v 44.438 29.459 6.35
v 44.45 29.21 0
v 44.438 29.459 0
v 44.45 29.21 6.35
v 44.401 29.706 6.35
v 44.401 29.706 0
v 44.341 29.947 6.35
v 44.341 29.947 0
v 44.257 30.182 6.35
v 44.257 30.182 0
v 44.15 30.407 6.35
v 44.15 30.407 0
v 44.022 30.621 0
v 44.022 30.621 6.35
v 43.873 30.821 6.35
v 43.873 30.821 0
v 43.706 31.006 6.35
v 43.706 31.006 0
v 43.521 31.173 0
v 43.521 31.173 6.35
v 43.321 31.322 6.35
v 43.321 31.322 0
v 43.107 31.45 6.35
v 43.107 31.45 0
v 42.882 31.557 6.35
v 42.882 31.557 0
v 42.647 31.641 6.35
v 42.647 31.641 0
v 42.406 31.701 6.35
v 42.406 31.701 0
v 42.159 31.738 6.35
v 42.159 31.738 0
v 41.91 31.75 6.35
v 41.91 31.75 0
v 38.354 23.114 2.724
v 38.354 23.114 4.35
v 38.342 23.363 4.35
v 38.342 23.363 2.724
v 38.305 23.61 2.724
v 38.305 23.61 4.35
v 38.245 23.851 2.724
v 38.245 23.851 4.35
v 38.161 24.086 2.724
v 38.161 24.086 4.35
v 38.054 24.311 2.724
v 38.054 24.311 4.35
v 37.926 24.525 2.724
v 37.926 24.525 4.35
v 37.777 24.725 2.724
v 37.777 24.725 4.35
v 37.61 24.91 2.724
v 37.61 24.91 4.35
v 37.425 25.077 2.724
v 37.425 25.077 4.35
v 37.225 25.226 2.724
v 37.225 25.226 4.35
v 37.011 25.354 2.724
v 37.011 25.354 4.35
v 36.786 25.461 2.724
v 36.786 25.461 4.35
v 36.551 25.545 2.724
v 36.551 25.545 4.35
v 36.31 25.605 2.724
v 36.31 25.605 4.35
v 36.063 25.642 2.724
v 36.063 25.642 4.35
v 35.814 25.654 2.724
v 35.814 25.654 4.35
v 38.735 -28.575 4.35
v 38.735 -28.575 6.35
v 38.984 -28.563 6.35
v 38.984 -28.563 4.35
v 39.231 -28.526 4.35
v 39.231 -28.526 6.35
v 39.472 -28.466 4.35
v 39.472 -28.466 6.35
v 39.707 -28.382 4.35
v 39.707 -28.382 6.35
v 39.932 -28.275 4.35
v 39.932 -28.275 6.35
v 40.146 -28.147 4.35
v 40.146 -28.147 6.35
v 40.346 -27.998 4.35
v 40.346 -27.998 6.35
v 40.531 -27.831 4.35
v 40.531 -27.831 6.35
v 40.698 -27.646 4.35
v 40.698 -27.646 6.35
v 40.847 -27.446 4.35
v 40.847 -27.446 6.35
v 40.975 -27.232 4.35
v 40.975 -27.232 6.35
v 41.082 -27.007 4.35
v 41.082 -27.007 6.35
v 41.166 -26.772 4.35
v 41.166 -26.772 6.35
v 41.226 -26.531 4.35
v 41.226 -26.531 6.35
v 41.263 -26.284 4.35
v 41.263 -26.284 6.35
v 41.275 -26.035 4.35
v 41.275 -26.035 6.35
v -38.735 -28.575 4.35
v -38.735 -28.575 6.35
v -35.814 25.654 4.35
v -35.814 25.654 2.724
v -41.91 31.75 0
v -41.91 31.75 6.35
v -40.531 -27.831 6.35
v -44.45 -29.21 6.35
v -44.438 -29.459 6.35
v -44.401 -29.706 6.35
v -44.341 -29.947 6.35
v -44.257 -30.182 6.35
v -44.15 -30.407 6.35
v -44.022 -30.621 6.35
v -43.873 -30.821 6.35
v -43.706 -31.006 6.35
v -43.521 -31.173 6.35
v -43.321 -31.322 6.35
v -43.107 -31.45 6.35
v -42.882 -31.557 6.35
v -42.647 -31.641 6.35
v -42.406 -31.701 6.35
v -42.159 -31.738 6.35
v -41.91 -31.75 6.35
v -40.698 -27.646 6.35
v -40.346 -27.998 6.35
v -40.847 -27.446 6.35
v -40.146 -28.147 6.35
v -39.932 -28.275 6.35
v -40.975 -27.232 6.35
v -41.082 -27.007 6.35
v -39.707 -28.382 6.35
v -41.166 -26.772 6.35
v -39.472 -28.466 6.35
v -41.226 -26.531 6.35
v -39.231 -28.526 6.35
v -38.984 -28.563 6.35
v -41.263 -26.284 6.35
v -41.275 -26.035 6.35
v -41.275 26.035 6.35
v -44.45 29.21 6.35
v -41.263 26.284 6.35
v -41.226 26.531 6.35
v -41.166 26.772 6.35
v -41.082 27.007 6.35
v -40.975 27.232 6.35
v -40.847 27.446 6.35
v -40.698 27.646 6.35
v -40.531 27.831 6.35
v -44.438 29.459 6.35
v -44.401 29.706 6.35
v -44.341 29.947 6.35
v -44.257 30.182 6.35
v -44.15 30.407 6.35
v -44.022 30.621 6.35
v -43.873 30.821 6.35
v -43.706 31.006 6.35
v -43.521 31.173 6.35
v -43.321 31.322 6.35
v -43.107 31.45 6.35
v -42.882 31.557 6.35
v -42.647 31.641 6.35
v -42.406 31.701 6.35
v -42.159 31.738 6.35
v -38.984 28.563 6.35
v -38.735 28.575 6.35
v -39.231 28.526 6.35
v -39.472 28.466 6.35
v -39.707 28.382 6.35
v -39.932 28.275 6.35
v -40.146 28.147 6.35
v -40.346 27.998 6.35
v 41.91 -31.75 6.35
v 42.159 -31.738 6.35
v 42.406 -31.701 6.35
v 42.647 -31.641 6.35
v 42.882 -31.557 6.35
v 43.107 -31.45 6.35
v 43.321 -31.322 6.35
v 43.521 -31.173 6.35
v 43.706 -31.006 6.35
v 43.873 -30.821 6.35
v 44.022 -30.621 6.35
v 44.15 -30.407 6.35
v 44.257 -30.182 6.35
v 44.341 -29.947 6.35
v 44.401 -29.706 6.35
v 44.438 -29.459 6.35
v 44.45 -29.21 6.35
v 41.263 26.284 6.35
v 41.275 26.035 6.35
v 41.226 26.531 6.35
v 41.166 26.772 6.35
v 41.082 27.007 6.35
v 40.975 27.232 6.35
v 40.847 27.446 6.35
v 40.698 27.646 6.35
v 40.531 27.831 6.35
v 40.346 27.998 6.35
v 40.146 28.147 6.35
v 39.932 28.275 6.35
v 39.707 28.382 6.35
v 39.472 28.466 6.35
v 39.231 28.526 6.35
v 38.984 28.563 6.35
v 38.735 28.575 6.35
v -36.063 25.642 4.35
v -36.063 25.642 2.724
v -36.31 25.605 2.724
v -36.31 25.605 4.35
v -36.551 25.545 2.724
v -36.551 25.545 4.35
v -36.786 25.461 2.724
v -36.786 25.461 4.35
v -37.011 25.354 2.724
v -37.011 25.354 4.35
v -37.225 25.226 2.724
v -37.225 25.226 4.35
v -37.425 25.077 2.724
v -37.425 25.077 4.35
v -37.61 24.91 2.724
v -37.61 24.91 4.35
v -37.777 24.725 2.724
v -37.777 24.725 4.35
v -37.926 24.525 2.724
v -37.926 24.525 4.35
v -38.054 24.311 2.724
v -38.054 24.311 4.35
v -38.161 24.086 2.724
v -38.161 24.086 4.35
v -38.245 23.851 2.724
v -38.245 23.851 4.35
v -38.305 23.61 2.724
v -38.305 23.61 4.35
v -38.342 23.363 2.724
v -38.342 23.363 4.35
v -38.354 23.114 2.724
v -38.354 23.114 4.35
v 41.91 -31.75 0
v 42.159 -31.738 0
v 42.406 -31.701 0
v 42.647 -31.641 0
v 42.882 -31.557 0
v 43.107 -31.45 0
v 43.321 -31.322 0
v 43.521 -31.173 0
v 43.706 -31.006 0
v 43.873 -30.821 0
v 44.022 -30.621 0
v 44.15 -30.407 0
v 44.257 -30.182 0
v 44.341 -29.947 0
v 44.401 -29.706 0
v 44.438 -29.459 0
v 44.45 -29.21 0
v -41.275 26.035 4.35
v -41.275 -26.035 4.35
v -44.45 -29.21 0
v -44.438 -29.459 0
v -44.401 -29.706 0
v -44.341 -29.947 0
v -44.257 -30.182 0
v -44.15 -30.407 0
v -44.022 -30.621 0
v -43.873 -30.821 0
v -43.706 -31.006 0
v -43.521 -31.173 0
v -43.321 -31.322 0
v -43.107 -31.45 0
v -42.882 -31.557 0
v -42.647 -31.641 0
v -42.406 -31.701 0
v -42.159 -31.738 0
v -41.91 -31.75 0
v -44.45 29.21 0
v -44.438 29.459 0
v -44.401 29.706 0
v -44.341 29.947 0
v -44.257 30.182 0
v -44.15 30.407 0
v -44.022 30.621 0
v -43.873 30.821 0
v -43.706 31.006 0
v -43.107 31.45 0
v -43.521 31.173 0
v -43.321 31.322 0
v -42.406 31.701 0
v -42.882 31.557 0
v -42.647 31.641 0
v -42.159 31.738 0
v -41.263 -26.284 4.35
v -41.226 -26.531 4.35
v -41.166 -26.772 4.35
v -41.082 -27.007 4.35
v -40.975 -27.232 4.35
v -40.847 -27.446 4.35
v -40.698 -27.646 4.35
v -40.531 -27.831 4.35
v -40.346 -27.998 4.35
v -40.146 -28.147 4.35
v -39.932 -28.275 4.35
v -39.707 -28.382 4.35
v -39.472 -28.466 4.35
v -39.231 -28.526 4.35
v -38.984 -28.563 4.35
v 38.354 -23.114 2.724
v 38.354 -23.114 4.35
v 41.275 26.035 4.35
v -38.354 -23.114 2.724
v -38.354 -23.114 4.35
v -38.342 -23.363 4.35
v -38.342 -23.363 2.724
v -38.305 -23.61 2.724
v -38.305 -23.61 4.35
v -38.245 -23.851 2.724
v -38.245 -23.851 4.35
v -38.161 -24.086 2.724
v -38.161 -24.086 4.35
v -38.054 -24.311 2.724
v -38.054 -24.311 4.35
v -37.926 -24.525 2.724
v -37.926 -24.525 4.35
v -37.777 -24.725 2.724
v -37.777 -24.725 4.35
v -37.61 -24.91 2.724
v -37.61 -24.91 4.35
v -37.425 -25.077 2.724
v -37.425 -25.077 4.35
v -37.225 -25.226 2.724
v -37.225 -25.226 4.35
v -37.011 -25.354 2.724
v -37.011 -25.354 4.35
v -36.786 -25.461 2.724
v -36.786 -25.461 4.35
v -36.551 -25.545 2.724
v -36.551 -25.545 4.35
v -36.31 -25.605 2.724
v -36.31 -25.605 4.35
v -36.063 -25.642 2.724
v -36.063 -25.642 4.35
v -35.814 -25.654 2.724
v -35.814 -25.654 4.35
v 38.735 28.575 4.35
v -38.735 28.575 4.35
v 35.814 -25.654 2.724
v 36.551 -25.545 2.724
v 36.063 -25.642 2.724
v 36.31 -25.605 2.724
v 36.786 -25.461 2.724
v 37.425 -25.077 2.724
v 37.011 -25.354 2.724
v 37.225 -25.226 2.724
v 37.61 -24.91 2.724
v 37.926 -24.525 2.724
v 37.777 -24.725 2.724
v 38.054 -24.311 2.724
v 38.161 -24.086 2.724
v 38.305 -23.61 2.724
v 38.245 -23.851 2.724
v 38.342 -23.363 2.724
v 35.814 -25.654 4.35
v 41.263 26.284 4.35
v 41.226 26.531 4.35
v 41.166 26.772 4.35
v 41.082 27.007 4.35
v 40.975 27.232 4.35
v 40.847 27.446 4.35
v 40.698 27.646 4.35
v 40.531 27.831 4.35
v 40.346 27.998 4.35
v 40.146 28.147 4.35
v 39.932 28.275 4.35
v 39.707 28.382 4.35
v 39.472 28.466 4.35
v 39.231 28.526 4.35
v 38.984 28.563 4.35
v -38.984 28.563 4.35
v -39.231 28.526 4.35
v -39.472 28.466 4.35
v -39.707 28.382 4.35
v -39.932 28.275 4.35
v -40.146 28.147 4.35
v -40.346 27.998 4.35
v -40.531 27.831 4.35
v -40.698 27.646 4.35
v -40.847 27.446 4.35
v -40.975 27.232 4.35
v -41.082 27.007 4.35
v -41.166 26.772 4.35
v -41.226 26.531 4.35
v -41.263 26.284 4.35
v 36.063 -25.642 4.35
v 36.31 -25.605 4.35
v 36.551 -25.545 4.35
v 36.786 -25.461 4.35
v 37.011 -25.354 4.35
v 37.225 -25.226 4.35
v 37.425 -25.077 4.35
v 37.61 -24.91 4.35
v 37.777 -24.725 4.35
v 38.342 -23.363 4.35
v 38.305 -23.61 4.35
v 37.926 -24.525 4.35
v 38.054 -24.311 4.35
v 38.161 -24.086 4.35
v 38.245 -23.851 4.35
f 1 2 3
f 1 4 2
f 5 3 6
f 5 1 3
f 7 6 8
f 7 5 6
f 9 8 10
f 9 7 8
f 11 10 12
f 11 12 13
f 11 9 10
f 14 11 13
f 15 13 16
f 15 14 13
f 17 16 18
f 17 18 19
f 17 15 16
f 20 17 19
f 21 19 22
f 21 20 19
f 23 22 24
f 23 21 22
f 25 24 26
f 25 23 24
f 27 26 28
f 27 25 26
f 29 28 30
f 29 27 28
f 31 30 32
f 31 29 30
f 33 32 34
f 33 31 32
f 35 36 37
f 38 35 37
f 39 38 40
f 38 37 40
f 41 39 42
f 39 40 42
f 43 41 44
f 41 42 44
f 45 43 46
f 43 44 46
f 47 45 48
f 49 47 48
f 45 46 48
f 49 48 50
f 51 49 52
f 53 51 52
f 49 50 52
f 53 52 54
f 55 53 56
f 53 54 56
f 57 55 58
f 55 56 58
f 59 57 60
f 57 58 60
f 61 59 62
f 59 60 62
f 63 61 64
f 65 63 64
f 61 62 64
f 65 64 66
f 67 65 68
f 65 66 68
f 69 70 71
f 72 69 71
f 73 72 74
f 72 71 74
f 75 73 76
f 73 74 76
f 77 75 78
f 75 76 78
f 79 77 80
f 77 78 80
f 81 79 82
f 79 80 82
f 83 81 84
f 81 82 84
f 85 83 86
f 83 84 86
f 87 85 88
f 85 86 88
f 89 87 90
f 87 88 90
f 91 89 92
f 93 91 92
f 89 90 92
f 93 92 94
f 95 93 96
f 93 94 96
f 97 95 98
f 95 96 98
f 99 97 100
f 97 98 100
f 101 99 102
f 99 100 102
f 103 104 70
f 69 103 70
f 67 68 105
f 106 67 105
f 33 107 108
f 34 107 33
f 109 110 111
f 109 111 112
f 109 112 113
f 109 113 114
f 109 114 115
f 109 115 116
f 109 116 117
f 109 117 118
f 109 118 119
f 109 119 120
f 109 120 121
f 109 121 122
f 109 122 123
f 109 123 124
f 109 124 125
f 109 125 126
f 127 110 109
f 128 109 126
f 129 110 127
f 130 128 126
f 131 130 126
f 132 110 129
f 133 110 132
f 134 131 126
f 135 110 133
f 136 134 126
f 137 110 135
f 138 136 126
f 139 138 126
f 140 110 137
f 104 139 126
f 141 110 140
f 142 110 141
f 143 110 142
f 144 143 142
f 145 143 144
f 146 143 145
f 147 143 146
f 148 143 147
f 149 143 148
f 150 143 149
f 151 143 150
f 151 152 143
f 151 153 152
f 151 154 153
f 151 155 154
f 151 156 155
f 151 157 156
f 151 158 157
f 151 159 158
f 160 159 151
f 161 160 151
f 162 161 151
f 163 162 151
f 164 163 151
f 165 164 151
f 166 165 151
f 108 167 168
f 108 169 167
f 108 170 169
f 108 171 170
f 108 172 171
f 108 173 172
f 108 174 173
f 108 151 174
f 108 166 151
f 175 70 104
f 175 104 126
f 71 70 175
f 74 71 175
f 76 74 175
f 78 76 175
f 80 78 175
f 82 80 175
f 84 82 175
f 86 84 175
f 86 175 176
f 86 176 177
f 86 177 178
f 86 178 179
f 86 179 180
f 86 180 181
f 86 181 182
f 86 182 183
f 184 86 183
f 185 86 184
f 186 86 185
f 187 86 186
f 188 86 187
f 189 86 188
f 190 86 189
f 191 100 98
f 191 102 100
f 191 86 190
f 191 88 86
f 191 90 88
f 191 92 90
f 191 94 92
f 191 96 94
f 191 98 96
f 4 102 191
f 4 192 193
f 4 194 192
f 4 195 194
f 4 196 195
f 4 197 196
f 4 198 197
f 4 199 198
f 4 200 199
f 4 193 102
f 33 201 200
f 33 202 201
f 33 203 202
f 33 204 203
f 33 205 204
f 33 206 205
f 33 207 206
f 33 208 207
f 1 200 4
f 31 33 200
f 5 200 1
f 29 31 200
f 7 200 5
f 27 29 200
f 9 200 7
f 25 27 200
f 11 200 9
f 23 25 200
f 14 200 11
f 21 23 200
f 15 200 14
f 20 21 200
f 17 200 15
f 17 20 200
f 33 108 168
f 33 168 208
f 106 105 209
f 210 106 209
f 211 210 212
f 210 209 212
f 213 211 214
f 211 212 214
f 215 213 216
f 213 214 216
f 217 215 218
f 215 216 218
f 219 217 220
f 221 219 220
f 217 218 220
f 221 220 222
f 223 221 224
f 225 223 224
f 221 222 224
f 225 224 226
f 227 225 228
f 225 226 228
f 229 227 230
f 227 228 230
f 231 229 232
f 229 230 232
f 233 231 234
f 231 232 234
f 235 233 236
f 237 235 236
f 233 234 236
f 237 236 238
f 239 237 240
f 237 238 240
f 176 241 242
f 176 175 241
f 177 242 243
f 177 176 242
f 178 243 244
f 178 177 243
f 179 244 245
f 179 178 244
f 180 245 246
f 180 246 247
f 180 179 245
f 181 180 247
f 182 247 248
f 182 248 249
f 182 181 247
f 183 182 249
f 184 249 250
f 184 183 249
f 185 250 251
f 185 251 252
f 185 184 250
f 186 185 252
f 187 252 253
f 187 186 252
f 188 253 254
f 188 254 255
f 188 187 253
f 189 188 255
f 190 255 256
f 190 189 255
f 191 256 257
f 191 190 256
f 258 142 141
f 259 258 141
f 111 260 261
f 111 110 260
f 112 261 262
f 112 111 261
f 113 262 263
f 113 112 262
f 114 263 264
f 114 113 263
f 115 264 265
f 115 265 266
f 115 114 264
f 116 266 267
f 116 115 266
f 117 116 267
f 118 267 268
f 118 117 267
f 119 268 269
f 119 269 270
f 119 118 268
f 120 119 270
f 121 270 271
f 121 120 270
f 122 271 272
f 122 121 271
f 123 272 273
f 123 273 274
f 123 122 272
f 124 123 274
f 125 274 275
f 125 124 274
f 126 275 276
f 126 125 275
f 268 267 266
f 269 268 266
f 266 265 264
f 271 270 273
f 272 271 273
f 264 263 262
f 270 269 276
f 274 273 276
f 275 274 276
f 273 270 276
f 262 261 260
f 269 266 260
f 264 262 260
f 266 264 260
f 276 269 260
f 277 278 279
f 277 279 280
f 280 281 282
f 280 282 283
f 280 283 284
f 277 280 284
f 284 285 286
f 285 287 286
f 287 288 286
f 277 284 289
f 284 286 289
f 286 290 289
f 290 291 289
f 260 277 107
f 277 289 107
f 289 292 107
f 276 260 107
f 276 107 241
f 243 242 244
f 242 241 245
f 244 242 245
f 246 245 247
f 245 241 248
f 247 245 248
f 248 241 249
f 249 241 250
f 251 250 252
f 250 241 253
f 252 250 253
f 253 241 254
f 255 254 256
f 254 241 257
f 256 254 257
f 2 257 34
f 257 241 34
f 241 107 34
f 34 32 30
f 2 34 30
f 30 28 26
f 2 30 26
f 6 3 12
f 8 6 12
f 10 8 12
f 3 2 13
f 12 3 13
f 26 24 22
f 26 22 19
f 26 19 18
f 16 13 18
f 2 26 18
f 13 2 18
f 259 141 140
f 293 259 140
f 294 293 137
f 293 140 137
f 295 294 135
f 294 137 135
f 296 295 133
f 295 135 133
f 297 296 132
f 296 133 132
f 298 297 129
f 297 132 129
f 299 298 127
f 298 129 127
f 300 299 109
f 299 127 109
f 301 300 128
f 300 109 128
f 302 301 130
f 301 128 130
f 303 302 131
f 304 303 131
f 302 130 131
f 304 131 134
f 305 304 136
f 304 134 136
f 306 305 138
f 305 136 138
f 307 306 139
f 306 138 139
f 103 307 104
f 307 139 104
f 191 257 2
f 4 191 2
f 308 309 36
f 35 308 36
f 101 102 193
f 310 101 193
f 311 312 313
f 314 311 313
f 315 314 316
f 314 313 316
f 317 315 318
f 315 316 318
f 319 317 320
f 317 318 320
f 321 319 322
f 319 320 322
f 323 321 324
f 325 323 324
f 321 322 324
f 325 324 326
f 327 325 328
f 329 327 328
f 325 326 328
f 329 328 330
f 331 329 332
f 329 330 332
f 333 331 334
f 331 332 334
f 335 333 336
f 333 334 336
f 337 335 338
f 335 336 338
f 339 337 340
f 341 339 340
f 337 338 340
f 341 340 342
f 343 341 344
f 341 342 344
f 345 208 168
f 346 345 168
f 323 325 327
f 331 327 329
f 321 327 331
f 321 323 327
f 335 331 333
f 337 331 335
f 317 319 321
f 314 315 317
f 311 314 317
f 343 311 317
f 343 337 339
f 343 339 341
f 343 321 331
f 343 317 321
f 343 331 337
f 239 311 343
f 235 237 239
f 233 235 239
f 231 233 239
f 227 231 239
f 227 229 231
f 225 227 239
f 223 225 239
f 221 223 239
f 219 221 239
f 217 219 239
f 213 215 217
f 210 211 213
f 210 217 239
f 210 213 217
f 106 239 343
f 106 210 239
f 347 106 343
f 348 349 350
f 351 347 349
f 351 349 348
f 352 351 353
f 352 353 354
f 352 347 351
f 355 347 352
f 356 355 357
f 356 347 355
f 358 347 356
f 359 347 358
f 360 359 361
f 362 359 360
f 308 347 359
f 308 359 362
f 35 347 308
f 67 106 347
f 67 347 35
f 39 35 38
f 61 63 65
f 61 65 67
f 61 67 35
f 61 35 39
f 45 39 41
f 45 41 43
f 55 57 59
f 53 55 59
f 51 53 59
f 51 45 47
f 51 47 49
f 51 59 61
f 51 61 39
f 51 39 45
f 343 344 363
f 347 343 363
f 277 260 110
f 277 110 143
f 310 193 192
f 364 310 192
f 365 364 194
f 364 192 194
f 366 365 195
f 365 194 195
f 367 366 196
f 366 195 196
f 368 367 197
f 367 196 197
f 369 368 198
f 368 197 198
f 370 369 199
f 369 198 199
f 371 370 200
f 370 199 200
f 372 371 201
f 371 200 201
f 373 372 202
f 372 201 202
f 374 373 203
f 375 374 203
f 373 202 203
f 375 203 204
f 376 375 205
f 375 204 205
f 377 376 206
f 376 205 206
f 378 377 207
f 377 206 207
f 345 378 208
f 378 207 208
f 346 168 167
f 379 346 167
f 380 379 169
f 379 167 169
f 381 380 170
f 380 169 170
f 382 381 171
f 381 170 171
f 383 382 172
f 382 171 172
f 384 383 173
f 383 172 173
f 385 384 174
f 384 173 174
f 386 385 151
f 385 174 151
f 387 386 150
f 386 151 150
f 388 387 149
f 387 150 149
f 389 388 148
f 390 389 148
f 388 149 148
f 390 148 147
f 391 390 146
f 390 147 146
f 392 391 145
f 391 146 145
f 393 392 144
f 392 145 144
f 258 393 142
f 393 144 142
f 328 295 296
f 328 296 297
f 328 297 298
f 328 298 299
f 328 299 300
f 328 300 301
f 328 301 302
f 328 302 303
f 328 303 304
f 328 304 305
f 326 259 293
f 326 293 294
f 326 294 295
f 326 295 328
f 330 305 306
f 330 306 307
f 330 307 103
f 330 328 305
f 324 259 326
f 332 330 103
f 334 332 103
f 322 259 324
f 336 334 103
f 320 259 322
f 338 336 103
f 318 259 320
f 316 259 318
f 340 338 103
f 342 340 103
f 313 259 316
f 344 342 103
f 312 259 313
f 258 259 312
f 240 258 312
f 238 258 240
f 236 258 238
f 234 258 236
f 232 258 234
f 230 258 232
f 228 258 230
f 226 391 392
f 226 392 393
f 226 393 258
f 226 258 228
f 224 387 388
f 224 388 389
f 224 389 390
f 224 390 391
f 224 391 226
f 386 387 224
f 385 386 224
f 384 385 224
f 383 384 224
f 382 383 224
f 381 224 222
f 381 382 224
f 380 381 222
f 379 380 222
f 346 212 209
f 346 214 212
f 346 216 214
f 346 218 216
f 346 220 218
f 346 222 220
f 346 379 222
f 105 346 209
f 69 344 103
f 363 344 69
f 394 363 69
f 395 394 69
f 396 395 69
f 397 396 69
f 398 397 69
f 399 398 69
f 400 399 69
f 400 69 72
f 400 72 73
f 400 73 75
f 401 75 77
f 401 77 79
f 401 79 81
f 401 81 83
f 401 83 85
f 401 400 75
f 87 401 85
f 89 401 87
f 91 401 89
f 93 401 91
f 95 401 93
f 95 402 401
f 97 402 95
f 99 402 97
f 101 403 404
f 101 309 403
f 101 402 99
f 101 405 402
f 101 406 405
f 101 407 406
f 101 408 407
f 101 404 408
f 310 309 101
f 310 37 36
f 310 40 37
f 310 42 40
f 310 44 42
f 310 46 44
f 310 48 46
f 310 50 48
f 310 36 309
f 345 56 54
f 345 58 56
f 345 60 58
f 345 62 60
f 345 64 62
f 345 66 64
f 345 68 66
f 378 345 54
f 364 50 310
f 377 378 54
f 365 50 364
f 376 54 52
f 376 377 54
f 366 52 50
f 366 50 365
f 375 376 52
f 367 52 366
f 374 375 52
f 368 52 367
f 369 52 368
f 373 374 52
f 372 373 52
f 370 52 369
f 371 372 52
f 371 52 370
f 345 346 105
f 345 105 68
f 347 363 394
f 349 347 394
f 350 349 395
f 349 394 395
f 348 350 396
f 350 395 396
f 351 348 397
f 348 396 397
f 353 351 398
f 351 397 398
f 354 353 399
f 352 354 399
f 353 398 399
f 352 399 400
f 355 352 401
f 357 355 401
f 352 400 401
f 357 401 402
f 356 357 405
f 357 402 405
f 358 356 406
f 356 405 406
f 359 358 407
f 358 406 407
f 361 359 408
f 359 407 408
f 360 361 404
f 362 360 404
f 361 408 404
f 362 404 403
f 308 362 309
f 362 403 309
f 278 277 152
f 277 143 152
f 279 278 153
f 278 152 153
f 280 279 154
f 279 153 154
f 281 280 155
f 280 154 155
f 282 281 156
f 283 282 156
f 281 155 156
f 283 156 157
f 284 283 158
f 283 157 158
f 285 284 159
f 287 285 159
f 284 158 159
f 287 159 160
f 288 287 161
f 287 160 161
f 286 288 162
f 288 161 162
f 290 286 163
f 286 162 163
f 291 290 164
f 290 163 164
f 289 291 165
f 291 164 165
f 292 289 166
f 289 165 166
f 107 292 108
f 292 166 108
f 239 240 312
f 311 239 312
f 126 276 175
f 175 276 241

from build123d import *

# Parameters (mm, degrees)
F0_W     = 88.9
F0_H     = 63.5
F1_DEPTH = 6.35
F2_R     = 2.54
F4_DEPTH = 2
F6_DEPTH = 1.6256


with BuildPart() as f1:
    # F0 (on Top) → F1 (new body)
    with BuildSketch(Plane.XY):
        Rectangle(F0_W, F0_H)
    extrude(amount=F1_DEPTH)

    # F2
    f2_edges = [f1.edges().sort_by_distance(p)[0] for p in [
        (-44.45, -31.75, 3.175),
        (44.45, -31.75, 3.175),
        (44.45, 31.75, 3.175),
        (-44.45, 31.75, 3.175),
    ]]
    fillet(f2_edges, radius=F2_R)

    # F3 (on face) → F4 (cut)
    with BuildSketch(Plane.XY.offset(6.35)):
        with BuildLine():
            Line((38.735, 28.575), (-38.735, 28.575))
            ThreePointArc((-38.735, 28.575), (-40.531051, 27.831051), (-41.275, 26.035))
            Line((-41.275, 26.035), (-41.275, -26.035))
            ThreePointArc((-41.275, -26.035), (-40.531051, -27.831051), (-38.735, -28.575))
            Line((-38.735, -28.575), (38.735, -28.575))
            ThreePointArc((38.735, -28.575), (40.531051, -27.831051), (41.275, -26.035))
            Line((41.275, -26.035), (41.275, 26.035))
            ThreePointArc((41.275, 26.035), (40.531051, 27.831051), (38.735, 28.575))
        make_face()
    extrude(amount=-F4_DEPTH, mode=Mode.SUBTRACT)

    # F5 (on face) → F6 (cut)
    with BuildSketch(Plane.XY.offset(4.35)):
        with BuildLine():
            Line((35.814, 25.654), (-35.814, 25.654))
            ThreePointArc((-35.814, 25.654), (-37.610051, 24.910051), (-38.354, 23.114))
            Line((-38.354, 23.114), (-38.354, -23.114))
            ThreePointArc((-38.354, -23.114), (-37.610051, -24.910051), (-35.814, -25.654))
            Line((-35.814, -25.654), (35.814, -25.654))
            ThreePointArc((35.814, -25.654), (37.610051, -24.910051), (38.354, -23.114))
            Line((38.354, -23.114), (38.354, 23.114))
            ThreePointArc((38.354, 23.114), (37.610051, 24.910051), (35.814, 25.654))
        make_face()
    extrude(amount=-F6_DEPTH, mode=Mode.SUBTRACT)


solid = f1.part
